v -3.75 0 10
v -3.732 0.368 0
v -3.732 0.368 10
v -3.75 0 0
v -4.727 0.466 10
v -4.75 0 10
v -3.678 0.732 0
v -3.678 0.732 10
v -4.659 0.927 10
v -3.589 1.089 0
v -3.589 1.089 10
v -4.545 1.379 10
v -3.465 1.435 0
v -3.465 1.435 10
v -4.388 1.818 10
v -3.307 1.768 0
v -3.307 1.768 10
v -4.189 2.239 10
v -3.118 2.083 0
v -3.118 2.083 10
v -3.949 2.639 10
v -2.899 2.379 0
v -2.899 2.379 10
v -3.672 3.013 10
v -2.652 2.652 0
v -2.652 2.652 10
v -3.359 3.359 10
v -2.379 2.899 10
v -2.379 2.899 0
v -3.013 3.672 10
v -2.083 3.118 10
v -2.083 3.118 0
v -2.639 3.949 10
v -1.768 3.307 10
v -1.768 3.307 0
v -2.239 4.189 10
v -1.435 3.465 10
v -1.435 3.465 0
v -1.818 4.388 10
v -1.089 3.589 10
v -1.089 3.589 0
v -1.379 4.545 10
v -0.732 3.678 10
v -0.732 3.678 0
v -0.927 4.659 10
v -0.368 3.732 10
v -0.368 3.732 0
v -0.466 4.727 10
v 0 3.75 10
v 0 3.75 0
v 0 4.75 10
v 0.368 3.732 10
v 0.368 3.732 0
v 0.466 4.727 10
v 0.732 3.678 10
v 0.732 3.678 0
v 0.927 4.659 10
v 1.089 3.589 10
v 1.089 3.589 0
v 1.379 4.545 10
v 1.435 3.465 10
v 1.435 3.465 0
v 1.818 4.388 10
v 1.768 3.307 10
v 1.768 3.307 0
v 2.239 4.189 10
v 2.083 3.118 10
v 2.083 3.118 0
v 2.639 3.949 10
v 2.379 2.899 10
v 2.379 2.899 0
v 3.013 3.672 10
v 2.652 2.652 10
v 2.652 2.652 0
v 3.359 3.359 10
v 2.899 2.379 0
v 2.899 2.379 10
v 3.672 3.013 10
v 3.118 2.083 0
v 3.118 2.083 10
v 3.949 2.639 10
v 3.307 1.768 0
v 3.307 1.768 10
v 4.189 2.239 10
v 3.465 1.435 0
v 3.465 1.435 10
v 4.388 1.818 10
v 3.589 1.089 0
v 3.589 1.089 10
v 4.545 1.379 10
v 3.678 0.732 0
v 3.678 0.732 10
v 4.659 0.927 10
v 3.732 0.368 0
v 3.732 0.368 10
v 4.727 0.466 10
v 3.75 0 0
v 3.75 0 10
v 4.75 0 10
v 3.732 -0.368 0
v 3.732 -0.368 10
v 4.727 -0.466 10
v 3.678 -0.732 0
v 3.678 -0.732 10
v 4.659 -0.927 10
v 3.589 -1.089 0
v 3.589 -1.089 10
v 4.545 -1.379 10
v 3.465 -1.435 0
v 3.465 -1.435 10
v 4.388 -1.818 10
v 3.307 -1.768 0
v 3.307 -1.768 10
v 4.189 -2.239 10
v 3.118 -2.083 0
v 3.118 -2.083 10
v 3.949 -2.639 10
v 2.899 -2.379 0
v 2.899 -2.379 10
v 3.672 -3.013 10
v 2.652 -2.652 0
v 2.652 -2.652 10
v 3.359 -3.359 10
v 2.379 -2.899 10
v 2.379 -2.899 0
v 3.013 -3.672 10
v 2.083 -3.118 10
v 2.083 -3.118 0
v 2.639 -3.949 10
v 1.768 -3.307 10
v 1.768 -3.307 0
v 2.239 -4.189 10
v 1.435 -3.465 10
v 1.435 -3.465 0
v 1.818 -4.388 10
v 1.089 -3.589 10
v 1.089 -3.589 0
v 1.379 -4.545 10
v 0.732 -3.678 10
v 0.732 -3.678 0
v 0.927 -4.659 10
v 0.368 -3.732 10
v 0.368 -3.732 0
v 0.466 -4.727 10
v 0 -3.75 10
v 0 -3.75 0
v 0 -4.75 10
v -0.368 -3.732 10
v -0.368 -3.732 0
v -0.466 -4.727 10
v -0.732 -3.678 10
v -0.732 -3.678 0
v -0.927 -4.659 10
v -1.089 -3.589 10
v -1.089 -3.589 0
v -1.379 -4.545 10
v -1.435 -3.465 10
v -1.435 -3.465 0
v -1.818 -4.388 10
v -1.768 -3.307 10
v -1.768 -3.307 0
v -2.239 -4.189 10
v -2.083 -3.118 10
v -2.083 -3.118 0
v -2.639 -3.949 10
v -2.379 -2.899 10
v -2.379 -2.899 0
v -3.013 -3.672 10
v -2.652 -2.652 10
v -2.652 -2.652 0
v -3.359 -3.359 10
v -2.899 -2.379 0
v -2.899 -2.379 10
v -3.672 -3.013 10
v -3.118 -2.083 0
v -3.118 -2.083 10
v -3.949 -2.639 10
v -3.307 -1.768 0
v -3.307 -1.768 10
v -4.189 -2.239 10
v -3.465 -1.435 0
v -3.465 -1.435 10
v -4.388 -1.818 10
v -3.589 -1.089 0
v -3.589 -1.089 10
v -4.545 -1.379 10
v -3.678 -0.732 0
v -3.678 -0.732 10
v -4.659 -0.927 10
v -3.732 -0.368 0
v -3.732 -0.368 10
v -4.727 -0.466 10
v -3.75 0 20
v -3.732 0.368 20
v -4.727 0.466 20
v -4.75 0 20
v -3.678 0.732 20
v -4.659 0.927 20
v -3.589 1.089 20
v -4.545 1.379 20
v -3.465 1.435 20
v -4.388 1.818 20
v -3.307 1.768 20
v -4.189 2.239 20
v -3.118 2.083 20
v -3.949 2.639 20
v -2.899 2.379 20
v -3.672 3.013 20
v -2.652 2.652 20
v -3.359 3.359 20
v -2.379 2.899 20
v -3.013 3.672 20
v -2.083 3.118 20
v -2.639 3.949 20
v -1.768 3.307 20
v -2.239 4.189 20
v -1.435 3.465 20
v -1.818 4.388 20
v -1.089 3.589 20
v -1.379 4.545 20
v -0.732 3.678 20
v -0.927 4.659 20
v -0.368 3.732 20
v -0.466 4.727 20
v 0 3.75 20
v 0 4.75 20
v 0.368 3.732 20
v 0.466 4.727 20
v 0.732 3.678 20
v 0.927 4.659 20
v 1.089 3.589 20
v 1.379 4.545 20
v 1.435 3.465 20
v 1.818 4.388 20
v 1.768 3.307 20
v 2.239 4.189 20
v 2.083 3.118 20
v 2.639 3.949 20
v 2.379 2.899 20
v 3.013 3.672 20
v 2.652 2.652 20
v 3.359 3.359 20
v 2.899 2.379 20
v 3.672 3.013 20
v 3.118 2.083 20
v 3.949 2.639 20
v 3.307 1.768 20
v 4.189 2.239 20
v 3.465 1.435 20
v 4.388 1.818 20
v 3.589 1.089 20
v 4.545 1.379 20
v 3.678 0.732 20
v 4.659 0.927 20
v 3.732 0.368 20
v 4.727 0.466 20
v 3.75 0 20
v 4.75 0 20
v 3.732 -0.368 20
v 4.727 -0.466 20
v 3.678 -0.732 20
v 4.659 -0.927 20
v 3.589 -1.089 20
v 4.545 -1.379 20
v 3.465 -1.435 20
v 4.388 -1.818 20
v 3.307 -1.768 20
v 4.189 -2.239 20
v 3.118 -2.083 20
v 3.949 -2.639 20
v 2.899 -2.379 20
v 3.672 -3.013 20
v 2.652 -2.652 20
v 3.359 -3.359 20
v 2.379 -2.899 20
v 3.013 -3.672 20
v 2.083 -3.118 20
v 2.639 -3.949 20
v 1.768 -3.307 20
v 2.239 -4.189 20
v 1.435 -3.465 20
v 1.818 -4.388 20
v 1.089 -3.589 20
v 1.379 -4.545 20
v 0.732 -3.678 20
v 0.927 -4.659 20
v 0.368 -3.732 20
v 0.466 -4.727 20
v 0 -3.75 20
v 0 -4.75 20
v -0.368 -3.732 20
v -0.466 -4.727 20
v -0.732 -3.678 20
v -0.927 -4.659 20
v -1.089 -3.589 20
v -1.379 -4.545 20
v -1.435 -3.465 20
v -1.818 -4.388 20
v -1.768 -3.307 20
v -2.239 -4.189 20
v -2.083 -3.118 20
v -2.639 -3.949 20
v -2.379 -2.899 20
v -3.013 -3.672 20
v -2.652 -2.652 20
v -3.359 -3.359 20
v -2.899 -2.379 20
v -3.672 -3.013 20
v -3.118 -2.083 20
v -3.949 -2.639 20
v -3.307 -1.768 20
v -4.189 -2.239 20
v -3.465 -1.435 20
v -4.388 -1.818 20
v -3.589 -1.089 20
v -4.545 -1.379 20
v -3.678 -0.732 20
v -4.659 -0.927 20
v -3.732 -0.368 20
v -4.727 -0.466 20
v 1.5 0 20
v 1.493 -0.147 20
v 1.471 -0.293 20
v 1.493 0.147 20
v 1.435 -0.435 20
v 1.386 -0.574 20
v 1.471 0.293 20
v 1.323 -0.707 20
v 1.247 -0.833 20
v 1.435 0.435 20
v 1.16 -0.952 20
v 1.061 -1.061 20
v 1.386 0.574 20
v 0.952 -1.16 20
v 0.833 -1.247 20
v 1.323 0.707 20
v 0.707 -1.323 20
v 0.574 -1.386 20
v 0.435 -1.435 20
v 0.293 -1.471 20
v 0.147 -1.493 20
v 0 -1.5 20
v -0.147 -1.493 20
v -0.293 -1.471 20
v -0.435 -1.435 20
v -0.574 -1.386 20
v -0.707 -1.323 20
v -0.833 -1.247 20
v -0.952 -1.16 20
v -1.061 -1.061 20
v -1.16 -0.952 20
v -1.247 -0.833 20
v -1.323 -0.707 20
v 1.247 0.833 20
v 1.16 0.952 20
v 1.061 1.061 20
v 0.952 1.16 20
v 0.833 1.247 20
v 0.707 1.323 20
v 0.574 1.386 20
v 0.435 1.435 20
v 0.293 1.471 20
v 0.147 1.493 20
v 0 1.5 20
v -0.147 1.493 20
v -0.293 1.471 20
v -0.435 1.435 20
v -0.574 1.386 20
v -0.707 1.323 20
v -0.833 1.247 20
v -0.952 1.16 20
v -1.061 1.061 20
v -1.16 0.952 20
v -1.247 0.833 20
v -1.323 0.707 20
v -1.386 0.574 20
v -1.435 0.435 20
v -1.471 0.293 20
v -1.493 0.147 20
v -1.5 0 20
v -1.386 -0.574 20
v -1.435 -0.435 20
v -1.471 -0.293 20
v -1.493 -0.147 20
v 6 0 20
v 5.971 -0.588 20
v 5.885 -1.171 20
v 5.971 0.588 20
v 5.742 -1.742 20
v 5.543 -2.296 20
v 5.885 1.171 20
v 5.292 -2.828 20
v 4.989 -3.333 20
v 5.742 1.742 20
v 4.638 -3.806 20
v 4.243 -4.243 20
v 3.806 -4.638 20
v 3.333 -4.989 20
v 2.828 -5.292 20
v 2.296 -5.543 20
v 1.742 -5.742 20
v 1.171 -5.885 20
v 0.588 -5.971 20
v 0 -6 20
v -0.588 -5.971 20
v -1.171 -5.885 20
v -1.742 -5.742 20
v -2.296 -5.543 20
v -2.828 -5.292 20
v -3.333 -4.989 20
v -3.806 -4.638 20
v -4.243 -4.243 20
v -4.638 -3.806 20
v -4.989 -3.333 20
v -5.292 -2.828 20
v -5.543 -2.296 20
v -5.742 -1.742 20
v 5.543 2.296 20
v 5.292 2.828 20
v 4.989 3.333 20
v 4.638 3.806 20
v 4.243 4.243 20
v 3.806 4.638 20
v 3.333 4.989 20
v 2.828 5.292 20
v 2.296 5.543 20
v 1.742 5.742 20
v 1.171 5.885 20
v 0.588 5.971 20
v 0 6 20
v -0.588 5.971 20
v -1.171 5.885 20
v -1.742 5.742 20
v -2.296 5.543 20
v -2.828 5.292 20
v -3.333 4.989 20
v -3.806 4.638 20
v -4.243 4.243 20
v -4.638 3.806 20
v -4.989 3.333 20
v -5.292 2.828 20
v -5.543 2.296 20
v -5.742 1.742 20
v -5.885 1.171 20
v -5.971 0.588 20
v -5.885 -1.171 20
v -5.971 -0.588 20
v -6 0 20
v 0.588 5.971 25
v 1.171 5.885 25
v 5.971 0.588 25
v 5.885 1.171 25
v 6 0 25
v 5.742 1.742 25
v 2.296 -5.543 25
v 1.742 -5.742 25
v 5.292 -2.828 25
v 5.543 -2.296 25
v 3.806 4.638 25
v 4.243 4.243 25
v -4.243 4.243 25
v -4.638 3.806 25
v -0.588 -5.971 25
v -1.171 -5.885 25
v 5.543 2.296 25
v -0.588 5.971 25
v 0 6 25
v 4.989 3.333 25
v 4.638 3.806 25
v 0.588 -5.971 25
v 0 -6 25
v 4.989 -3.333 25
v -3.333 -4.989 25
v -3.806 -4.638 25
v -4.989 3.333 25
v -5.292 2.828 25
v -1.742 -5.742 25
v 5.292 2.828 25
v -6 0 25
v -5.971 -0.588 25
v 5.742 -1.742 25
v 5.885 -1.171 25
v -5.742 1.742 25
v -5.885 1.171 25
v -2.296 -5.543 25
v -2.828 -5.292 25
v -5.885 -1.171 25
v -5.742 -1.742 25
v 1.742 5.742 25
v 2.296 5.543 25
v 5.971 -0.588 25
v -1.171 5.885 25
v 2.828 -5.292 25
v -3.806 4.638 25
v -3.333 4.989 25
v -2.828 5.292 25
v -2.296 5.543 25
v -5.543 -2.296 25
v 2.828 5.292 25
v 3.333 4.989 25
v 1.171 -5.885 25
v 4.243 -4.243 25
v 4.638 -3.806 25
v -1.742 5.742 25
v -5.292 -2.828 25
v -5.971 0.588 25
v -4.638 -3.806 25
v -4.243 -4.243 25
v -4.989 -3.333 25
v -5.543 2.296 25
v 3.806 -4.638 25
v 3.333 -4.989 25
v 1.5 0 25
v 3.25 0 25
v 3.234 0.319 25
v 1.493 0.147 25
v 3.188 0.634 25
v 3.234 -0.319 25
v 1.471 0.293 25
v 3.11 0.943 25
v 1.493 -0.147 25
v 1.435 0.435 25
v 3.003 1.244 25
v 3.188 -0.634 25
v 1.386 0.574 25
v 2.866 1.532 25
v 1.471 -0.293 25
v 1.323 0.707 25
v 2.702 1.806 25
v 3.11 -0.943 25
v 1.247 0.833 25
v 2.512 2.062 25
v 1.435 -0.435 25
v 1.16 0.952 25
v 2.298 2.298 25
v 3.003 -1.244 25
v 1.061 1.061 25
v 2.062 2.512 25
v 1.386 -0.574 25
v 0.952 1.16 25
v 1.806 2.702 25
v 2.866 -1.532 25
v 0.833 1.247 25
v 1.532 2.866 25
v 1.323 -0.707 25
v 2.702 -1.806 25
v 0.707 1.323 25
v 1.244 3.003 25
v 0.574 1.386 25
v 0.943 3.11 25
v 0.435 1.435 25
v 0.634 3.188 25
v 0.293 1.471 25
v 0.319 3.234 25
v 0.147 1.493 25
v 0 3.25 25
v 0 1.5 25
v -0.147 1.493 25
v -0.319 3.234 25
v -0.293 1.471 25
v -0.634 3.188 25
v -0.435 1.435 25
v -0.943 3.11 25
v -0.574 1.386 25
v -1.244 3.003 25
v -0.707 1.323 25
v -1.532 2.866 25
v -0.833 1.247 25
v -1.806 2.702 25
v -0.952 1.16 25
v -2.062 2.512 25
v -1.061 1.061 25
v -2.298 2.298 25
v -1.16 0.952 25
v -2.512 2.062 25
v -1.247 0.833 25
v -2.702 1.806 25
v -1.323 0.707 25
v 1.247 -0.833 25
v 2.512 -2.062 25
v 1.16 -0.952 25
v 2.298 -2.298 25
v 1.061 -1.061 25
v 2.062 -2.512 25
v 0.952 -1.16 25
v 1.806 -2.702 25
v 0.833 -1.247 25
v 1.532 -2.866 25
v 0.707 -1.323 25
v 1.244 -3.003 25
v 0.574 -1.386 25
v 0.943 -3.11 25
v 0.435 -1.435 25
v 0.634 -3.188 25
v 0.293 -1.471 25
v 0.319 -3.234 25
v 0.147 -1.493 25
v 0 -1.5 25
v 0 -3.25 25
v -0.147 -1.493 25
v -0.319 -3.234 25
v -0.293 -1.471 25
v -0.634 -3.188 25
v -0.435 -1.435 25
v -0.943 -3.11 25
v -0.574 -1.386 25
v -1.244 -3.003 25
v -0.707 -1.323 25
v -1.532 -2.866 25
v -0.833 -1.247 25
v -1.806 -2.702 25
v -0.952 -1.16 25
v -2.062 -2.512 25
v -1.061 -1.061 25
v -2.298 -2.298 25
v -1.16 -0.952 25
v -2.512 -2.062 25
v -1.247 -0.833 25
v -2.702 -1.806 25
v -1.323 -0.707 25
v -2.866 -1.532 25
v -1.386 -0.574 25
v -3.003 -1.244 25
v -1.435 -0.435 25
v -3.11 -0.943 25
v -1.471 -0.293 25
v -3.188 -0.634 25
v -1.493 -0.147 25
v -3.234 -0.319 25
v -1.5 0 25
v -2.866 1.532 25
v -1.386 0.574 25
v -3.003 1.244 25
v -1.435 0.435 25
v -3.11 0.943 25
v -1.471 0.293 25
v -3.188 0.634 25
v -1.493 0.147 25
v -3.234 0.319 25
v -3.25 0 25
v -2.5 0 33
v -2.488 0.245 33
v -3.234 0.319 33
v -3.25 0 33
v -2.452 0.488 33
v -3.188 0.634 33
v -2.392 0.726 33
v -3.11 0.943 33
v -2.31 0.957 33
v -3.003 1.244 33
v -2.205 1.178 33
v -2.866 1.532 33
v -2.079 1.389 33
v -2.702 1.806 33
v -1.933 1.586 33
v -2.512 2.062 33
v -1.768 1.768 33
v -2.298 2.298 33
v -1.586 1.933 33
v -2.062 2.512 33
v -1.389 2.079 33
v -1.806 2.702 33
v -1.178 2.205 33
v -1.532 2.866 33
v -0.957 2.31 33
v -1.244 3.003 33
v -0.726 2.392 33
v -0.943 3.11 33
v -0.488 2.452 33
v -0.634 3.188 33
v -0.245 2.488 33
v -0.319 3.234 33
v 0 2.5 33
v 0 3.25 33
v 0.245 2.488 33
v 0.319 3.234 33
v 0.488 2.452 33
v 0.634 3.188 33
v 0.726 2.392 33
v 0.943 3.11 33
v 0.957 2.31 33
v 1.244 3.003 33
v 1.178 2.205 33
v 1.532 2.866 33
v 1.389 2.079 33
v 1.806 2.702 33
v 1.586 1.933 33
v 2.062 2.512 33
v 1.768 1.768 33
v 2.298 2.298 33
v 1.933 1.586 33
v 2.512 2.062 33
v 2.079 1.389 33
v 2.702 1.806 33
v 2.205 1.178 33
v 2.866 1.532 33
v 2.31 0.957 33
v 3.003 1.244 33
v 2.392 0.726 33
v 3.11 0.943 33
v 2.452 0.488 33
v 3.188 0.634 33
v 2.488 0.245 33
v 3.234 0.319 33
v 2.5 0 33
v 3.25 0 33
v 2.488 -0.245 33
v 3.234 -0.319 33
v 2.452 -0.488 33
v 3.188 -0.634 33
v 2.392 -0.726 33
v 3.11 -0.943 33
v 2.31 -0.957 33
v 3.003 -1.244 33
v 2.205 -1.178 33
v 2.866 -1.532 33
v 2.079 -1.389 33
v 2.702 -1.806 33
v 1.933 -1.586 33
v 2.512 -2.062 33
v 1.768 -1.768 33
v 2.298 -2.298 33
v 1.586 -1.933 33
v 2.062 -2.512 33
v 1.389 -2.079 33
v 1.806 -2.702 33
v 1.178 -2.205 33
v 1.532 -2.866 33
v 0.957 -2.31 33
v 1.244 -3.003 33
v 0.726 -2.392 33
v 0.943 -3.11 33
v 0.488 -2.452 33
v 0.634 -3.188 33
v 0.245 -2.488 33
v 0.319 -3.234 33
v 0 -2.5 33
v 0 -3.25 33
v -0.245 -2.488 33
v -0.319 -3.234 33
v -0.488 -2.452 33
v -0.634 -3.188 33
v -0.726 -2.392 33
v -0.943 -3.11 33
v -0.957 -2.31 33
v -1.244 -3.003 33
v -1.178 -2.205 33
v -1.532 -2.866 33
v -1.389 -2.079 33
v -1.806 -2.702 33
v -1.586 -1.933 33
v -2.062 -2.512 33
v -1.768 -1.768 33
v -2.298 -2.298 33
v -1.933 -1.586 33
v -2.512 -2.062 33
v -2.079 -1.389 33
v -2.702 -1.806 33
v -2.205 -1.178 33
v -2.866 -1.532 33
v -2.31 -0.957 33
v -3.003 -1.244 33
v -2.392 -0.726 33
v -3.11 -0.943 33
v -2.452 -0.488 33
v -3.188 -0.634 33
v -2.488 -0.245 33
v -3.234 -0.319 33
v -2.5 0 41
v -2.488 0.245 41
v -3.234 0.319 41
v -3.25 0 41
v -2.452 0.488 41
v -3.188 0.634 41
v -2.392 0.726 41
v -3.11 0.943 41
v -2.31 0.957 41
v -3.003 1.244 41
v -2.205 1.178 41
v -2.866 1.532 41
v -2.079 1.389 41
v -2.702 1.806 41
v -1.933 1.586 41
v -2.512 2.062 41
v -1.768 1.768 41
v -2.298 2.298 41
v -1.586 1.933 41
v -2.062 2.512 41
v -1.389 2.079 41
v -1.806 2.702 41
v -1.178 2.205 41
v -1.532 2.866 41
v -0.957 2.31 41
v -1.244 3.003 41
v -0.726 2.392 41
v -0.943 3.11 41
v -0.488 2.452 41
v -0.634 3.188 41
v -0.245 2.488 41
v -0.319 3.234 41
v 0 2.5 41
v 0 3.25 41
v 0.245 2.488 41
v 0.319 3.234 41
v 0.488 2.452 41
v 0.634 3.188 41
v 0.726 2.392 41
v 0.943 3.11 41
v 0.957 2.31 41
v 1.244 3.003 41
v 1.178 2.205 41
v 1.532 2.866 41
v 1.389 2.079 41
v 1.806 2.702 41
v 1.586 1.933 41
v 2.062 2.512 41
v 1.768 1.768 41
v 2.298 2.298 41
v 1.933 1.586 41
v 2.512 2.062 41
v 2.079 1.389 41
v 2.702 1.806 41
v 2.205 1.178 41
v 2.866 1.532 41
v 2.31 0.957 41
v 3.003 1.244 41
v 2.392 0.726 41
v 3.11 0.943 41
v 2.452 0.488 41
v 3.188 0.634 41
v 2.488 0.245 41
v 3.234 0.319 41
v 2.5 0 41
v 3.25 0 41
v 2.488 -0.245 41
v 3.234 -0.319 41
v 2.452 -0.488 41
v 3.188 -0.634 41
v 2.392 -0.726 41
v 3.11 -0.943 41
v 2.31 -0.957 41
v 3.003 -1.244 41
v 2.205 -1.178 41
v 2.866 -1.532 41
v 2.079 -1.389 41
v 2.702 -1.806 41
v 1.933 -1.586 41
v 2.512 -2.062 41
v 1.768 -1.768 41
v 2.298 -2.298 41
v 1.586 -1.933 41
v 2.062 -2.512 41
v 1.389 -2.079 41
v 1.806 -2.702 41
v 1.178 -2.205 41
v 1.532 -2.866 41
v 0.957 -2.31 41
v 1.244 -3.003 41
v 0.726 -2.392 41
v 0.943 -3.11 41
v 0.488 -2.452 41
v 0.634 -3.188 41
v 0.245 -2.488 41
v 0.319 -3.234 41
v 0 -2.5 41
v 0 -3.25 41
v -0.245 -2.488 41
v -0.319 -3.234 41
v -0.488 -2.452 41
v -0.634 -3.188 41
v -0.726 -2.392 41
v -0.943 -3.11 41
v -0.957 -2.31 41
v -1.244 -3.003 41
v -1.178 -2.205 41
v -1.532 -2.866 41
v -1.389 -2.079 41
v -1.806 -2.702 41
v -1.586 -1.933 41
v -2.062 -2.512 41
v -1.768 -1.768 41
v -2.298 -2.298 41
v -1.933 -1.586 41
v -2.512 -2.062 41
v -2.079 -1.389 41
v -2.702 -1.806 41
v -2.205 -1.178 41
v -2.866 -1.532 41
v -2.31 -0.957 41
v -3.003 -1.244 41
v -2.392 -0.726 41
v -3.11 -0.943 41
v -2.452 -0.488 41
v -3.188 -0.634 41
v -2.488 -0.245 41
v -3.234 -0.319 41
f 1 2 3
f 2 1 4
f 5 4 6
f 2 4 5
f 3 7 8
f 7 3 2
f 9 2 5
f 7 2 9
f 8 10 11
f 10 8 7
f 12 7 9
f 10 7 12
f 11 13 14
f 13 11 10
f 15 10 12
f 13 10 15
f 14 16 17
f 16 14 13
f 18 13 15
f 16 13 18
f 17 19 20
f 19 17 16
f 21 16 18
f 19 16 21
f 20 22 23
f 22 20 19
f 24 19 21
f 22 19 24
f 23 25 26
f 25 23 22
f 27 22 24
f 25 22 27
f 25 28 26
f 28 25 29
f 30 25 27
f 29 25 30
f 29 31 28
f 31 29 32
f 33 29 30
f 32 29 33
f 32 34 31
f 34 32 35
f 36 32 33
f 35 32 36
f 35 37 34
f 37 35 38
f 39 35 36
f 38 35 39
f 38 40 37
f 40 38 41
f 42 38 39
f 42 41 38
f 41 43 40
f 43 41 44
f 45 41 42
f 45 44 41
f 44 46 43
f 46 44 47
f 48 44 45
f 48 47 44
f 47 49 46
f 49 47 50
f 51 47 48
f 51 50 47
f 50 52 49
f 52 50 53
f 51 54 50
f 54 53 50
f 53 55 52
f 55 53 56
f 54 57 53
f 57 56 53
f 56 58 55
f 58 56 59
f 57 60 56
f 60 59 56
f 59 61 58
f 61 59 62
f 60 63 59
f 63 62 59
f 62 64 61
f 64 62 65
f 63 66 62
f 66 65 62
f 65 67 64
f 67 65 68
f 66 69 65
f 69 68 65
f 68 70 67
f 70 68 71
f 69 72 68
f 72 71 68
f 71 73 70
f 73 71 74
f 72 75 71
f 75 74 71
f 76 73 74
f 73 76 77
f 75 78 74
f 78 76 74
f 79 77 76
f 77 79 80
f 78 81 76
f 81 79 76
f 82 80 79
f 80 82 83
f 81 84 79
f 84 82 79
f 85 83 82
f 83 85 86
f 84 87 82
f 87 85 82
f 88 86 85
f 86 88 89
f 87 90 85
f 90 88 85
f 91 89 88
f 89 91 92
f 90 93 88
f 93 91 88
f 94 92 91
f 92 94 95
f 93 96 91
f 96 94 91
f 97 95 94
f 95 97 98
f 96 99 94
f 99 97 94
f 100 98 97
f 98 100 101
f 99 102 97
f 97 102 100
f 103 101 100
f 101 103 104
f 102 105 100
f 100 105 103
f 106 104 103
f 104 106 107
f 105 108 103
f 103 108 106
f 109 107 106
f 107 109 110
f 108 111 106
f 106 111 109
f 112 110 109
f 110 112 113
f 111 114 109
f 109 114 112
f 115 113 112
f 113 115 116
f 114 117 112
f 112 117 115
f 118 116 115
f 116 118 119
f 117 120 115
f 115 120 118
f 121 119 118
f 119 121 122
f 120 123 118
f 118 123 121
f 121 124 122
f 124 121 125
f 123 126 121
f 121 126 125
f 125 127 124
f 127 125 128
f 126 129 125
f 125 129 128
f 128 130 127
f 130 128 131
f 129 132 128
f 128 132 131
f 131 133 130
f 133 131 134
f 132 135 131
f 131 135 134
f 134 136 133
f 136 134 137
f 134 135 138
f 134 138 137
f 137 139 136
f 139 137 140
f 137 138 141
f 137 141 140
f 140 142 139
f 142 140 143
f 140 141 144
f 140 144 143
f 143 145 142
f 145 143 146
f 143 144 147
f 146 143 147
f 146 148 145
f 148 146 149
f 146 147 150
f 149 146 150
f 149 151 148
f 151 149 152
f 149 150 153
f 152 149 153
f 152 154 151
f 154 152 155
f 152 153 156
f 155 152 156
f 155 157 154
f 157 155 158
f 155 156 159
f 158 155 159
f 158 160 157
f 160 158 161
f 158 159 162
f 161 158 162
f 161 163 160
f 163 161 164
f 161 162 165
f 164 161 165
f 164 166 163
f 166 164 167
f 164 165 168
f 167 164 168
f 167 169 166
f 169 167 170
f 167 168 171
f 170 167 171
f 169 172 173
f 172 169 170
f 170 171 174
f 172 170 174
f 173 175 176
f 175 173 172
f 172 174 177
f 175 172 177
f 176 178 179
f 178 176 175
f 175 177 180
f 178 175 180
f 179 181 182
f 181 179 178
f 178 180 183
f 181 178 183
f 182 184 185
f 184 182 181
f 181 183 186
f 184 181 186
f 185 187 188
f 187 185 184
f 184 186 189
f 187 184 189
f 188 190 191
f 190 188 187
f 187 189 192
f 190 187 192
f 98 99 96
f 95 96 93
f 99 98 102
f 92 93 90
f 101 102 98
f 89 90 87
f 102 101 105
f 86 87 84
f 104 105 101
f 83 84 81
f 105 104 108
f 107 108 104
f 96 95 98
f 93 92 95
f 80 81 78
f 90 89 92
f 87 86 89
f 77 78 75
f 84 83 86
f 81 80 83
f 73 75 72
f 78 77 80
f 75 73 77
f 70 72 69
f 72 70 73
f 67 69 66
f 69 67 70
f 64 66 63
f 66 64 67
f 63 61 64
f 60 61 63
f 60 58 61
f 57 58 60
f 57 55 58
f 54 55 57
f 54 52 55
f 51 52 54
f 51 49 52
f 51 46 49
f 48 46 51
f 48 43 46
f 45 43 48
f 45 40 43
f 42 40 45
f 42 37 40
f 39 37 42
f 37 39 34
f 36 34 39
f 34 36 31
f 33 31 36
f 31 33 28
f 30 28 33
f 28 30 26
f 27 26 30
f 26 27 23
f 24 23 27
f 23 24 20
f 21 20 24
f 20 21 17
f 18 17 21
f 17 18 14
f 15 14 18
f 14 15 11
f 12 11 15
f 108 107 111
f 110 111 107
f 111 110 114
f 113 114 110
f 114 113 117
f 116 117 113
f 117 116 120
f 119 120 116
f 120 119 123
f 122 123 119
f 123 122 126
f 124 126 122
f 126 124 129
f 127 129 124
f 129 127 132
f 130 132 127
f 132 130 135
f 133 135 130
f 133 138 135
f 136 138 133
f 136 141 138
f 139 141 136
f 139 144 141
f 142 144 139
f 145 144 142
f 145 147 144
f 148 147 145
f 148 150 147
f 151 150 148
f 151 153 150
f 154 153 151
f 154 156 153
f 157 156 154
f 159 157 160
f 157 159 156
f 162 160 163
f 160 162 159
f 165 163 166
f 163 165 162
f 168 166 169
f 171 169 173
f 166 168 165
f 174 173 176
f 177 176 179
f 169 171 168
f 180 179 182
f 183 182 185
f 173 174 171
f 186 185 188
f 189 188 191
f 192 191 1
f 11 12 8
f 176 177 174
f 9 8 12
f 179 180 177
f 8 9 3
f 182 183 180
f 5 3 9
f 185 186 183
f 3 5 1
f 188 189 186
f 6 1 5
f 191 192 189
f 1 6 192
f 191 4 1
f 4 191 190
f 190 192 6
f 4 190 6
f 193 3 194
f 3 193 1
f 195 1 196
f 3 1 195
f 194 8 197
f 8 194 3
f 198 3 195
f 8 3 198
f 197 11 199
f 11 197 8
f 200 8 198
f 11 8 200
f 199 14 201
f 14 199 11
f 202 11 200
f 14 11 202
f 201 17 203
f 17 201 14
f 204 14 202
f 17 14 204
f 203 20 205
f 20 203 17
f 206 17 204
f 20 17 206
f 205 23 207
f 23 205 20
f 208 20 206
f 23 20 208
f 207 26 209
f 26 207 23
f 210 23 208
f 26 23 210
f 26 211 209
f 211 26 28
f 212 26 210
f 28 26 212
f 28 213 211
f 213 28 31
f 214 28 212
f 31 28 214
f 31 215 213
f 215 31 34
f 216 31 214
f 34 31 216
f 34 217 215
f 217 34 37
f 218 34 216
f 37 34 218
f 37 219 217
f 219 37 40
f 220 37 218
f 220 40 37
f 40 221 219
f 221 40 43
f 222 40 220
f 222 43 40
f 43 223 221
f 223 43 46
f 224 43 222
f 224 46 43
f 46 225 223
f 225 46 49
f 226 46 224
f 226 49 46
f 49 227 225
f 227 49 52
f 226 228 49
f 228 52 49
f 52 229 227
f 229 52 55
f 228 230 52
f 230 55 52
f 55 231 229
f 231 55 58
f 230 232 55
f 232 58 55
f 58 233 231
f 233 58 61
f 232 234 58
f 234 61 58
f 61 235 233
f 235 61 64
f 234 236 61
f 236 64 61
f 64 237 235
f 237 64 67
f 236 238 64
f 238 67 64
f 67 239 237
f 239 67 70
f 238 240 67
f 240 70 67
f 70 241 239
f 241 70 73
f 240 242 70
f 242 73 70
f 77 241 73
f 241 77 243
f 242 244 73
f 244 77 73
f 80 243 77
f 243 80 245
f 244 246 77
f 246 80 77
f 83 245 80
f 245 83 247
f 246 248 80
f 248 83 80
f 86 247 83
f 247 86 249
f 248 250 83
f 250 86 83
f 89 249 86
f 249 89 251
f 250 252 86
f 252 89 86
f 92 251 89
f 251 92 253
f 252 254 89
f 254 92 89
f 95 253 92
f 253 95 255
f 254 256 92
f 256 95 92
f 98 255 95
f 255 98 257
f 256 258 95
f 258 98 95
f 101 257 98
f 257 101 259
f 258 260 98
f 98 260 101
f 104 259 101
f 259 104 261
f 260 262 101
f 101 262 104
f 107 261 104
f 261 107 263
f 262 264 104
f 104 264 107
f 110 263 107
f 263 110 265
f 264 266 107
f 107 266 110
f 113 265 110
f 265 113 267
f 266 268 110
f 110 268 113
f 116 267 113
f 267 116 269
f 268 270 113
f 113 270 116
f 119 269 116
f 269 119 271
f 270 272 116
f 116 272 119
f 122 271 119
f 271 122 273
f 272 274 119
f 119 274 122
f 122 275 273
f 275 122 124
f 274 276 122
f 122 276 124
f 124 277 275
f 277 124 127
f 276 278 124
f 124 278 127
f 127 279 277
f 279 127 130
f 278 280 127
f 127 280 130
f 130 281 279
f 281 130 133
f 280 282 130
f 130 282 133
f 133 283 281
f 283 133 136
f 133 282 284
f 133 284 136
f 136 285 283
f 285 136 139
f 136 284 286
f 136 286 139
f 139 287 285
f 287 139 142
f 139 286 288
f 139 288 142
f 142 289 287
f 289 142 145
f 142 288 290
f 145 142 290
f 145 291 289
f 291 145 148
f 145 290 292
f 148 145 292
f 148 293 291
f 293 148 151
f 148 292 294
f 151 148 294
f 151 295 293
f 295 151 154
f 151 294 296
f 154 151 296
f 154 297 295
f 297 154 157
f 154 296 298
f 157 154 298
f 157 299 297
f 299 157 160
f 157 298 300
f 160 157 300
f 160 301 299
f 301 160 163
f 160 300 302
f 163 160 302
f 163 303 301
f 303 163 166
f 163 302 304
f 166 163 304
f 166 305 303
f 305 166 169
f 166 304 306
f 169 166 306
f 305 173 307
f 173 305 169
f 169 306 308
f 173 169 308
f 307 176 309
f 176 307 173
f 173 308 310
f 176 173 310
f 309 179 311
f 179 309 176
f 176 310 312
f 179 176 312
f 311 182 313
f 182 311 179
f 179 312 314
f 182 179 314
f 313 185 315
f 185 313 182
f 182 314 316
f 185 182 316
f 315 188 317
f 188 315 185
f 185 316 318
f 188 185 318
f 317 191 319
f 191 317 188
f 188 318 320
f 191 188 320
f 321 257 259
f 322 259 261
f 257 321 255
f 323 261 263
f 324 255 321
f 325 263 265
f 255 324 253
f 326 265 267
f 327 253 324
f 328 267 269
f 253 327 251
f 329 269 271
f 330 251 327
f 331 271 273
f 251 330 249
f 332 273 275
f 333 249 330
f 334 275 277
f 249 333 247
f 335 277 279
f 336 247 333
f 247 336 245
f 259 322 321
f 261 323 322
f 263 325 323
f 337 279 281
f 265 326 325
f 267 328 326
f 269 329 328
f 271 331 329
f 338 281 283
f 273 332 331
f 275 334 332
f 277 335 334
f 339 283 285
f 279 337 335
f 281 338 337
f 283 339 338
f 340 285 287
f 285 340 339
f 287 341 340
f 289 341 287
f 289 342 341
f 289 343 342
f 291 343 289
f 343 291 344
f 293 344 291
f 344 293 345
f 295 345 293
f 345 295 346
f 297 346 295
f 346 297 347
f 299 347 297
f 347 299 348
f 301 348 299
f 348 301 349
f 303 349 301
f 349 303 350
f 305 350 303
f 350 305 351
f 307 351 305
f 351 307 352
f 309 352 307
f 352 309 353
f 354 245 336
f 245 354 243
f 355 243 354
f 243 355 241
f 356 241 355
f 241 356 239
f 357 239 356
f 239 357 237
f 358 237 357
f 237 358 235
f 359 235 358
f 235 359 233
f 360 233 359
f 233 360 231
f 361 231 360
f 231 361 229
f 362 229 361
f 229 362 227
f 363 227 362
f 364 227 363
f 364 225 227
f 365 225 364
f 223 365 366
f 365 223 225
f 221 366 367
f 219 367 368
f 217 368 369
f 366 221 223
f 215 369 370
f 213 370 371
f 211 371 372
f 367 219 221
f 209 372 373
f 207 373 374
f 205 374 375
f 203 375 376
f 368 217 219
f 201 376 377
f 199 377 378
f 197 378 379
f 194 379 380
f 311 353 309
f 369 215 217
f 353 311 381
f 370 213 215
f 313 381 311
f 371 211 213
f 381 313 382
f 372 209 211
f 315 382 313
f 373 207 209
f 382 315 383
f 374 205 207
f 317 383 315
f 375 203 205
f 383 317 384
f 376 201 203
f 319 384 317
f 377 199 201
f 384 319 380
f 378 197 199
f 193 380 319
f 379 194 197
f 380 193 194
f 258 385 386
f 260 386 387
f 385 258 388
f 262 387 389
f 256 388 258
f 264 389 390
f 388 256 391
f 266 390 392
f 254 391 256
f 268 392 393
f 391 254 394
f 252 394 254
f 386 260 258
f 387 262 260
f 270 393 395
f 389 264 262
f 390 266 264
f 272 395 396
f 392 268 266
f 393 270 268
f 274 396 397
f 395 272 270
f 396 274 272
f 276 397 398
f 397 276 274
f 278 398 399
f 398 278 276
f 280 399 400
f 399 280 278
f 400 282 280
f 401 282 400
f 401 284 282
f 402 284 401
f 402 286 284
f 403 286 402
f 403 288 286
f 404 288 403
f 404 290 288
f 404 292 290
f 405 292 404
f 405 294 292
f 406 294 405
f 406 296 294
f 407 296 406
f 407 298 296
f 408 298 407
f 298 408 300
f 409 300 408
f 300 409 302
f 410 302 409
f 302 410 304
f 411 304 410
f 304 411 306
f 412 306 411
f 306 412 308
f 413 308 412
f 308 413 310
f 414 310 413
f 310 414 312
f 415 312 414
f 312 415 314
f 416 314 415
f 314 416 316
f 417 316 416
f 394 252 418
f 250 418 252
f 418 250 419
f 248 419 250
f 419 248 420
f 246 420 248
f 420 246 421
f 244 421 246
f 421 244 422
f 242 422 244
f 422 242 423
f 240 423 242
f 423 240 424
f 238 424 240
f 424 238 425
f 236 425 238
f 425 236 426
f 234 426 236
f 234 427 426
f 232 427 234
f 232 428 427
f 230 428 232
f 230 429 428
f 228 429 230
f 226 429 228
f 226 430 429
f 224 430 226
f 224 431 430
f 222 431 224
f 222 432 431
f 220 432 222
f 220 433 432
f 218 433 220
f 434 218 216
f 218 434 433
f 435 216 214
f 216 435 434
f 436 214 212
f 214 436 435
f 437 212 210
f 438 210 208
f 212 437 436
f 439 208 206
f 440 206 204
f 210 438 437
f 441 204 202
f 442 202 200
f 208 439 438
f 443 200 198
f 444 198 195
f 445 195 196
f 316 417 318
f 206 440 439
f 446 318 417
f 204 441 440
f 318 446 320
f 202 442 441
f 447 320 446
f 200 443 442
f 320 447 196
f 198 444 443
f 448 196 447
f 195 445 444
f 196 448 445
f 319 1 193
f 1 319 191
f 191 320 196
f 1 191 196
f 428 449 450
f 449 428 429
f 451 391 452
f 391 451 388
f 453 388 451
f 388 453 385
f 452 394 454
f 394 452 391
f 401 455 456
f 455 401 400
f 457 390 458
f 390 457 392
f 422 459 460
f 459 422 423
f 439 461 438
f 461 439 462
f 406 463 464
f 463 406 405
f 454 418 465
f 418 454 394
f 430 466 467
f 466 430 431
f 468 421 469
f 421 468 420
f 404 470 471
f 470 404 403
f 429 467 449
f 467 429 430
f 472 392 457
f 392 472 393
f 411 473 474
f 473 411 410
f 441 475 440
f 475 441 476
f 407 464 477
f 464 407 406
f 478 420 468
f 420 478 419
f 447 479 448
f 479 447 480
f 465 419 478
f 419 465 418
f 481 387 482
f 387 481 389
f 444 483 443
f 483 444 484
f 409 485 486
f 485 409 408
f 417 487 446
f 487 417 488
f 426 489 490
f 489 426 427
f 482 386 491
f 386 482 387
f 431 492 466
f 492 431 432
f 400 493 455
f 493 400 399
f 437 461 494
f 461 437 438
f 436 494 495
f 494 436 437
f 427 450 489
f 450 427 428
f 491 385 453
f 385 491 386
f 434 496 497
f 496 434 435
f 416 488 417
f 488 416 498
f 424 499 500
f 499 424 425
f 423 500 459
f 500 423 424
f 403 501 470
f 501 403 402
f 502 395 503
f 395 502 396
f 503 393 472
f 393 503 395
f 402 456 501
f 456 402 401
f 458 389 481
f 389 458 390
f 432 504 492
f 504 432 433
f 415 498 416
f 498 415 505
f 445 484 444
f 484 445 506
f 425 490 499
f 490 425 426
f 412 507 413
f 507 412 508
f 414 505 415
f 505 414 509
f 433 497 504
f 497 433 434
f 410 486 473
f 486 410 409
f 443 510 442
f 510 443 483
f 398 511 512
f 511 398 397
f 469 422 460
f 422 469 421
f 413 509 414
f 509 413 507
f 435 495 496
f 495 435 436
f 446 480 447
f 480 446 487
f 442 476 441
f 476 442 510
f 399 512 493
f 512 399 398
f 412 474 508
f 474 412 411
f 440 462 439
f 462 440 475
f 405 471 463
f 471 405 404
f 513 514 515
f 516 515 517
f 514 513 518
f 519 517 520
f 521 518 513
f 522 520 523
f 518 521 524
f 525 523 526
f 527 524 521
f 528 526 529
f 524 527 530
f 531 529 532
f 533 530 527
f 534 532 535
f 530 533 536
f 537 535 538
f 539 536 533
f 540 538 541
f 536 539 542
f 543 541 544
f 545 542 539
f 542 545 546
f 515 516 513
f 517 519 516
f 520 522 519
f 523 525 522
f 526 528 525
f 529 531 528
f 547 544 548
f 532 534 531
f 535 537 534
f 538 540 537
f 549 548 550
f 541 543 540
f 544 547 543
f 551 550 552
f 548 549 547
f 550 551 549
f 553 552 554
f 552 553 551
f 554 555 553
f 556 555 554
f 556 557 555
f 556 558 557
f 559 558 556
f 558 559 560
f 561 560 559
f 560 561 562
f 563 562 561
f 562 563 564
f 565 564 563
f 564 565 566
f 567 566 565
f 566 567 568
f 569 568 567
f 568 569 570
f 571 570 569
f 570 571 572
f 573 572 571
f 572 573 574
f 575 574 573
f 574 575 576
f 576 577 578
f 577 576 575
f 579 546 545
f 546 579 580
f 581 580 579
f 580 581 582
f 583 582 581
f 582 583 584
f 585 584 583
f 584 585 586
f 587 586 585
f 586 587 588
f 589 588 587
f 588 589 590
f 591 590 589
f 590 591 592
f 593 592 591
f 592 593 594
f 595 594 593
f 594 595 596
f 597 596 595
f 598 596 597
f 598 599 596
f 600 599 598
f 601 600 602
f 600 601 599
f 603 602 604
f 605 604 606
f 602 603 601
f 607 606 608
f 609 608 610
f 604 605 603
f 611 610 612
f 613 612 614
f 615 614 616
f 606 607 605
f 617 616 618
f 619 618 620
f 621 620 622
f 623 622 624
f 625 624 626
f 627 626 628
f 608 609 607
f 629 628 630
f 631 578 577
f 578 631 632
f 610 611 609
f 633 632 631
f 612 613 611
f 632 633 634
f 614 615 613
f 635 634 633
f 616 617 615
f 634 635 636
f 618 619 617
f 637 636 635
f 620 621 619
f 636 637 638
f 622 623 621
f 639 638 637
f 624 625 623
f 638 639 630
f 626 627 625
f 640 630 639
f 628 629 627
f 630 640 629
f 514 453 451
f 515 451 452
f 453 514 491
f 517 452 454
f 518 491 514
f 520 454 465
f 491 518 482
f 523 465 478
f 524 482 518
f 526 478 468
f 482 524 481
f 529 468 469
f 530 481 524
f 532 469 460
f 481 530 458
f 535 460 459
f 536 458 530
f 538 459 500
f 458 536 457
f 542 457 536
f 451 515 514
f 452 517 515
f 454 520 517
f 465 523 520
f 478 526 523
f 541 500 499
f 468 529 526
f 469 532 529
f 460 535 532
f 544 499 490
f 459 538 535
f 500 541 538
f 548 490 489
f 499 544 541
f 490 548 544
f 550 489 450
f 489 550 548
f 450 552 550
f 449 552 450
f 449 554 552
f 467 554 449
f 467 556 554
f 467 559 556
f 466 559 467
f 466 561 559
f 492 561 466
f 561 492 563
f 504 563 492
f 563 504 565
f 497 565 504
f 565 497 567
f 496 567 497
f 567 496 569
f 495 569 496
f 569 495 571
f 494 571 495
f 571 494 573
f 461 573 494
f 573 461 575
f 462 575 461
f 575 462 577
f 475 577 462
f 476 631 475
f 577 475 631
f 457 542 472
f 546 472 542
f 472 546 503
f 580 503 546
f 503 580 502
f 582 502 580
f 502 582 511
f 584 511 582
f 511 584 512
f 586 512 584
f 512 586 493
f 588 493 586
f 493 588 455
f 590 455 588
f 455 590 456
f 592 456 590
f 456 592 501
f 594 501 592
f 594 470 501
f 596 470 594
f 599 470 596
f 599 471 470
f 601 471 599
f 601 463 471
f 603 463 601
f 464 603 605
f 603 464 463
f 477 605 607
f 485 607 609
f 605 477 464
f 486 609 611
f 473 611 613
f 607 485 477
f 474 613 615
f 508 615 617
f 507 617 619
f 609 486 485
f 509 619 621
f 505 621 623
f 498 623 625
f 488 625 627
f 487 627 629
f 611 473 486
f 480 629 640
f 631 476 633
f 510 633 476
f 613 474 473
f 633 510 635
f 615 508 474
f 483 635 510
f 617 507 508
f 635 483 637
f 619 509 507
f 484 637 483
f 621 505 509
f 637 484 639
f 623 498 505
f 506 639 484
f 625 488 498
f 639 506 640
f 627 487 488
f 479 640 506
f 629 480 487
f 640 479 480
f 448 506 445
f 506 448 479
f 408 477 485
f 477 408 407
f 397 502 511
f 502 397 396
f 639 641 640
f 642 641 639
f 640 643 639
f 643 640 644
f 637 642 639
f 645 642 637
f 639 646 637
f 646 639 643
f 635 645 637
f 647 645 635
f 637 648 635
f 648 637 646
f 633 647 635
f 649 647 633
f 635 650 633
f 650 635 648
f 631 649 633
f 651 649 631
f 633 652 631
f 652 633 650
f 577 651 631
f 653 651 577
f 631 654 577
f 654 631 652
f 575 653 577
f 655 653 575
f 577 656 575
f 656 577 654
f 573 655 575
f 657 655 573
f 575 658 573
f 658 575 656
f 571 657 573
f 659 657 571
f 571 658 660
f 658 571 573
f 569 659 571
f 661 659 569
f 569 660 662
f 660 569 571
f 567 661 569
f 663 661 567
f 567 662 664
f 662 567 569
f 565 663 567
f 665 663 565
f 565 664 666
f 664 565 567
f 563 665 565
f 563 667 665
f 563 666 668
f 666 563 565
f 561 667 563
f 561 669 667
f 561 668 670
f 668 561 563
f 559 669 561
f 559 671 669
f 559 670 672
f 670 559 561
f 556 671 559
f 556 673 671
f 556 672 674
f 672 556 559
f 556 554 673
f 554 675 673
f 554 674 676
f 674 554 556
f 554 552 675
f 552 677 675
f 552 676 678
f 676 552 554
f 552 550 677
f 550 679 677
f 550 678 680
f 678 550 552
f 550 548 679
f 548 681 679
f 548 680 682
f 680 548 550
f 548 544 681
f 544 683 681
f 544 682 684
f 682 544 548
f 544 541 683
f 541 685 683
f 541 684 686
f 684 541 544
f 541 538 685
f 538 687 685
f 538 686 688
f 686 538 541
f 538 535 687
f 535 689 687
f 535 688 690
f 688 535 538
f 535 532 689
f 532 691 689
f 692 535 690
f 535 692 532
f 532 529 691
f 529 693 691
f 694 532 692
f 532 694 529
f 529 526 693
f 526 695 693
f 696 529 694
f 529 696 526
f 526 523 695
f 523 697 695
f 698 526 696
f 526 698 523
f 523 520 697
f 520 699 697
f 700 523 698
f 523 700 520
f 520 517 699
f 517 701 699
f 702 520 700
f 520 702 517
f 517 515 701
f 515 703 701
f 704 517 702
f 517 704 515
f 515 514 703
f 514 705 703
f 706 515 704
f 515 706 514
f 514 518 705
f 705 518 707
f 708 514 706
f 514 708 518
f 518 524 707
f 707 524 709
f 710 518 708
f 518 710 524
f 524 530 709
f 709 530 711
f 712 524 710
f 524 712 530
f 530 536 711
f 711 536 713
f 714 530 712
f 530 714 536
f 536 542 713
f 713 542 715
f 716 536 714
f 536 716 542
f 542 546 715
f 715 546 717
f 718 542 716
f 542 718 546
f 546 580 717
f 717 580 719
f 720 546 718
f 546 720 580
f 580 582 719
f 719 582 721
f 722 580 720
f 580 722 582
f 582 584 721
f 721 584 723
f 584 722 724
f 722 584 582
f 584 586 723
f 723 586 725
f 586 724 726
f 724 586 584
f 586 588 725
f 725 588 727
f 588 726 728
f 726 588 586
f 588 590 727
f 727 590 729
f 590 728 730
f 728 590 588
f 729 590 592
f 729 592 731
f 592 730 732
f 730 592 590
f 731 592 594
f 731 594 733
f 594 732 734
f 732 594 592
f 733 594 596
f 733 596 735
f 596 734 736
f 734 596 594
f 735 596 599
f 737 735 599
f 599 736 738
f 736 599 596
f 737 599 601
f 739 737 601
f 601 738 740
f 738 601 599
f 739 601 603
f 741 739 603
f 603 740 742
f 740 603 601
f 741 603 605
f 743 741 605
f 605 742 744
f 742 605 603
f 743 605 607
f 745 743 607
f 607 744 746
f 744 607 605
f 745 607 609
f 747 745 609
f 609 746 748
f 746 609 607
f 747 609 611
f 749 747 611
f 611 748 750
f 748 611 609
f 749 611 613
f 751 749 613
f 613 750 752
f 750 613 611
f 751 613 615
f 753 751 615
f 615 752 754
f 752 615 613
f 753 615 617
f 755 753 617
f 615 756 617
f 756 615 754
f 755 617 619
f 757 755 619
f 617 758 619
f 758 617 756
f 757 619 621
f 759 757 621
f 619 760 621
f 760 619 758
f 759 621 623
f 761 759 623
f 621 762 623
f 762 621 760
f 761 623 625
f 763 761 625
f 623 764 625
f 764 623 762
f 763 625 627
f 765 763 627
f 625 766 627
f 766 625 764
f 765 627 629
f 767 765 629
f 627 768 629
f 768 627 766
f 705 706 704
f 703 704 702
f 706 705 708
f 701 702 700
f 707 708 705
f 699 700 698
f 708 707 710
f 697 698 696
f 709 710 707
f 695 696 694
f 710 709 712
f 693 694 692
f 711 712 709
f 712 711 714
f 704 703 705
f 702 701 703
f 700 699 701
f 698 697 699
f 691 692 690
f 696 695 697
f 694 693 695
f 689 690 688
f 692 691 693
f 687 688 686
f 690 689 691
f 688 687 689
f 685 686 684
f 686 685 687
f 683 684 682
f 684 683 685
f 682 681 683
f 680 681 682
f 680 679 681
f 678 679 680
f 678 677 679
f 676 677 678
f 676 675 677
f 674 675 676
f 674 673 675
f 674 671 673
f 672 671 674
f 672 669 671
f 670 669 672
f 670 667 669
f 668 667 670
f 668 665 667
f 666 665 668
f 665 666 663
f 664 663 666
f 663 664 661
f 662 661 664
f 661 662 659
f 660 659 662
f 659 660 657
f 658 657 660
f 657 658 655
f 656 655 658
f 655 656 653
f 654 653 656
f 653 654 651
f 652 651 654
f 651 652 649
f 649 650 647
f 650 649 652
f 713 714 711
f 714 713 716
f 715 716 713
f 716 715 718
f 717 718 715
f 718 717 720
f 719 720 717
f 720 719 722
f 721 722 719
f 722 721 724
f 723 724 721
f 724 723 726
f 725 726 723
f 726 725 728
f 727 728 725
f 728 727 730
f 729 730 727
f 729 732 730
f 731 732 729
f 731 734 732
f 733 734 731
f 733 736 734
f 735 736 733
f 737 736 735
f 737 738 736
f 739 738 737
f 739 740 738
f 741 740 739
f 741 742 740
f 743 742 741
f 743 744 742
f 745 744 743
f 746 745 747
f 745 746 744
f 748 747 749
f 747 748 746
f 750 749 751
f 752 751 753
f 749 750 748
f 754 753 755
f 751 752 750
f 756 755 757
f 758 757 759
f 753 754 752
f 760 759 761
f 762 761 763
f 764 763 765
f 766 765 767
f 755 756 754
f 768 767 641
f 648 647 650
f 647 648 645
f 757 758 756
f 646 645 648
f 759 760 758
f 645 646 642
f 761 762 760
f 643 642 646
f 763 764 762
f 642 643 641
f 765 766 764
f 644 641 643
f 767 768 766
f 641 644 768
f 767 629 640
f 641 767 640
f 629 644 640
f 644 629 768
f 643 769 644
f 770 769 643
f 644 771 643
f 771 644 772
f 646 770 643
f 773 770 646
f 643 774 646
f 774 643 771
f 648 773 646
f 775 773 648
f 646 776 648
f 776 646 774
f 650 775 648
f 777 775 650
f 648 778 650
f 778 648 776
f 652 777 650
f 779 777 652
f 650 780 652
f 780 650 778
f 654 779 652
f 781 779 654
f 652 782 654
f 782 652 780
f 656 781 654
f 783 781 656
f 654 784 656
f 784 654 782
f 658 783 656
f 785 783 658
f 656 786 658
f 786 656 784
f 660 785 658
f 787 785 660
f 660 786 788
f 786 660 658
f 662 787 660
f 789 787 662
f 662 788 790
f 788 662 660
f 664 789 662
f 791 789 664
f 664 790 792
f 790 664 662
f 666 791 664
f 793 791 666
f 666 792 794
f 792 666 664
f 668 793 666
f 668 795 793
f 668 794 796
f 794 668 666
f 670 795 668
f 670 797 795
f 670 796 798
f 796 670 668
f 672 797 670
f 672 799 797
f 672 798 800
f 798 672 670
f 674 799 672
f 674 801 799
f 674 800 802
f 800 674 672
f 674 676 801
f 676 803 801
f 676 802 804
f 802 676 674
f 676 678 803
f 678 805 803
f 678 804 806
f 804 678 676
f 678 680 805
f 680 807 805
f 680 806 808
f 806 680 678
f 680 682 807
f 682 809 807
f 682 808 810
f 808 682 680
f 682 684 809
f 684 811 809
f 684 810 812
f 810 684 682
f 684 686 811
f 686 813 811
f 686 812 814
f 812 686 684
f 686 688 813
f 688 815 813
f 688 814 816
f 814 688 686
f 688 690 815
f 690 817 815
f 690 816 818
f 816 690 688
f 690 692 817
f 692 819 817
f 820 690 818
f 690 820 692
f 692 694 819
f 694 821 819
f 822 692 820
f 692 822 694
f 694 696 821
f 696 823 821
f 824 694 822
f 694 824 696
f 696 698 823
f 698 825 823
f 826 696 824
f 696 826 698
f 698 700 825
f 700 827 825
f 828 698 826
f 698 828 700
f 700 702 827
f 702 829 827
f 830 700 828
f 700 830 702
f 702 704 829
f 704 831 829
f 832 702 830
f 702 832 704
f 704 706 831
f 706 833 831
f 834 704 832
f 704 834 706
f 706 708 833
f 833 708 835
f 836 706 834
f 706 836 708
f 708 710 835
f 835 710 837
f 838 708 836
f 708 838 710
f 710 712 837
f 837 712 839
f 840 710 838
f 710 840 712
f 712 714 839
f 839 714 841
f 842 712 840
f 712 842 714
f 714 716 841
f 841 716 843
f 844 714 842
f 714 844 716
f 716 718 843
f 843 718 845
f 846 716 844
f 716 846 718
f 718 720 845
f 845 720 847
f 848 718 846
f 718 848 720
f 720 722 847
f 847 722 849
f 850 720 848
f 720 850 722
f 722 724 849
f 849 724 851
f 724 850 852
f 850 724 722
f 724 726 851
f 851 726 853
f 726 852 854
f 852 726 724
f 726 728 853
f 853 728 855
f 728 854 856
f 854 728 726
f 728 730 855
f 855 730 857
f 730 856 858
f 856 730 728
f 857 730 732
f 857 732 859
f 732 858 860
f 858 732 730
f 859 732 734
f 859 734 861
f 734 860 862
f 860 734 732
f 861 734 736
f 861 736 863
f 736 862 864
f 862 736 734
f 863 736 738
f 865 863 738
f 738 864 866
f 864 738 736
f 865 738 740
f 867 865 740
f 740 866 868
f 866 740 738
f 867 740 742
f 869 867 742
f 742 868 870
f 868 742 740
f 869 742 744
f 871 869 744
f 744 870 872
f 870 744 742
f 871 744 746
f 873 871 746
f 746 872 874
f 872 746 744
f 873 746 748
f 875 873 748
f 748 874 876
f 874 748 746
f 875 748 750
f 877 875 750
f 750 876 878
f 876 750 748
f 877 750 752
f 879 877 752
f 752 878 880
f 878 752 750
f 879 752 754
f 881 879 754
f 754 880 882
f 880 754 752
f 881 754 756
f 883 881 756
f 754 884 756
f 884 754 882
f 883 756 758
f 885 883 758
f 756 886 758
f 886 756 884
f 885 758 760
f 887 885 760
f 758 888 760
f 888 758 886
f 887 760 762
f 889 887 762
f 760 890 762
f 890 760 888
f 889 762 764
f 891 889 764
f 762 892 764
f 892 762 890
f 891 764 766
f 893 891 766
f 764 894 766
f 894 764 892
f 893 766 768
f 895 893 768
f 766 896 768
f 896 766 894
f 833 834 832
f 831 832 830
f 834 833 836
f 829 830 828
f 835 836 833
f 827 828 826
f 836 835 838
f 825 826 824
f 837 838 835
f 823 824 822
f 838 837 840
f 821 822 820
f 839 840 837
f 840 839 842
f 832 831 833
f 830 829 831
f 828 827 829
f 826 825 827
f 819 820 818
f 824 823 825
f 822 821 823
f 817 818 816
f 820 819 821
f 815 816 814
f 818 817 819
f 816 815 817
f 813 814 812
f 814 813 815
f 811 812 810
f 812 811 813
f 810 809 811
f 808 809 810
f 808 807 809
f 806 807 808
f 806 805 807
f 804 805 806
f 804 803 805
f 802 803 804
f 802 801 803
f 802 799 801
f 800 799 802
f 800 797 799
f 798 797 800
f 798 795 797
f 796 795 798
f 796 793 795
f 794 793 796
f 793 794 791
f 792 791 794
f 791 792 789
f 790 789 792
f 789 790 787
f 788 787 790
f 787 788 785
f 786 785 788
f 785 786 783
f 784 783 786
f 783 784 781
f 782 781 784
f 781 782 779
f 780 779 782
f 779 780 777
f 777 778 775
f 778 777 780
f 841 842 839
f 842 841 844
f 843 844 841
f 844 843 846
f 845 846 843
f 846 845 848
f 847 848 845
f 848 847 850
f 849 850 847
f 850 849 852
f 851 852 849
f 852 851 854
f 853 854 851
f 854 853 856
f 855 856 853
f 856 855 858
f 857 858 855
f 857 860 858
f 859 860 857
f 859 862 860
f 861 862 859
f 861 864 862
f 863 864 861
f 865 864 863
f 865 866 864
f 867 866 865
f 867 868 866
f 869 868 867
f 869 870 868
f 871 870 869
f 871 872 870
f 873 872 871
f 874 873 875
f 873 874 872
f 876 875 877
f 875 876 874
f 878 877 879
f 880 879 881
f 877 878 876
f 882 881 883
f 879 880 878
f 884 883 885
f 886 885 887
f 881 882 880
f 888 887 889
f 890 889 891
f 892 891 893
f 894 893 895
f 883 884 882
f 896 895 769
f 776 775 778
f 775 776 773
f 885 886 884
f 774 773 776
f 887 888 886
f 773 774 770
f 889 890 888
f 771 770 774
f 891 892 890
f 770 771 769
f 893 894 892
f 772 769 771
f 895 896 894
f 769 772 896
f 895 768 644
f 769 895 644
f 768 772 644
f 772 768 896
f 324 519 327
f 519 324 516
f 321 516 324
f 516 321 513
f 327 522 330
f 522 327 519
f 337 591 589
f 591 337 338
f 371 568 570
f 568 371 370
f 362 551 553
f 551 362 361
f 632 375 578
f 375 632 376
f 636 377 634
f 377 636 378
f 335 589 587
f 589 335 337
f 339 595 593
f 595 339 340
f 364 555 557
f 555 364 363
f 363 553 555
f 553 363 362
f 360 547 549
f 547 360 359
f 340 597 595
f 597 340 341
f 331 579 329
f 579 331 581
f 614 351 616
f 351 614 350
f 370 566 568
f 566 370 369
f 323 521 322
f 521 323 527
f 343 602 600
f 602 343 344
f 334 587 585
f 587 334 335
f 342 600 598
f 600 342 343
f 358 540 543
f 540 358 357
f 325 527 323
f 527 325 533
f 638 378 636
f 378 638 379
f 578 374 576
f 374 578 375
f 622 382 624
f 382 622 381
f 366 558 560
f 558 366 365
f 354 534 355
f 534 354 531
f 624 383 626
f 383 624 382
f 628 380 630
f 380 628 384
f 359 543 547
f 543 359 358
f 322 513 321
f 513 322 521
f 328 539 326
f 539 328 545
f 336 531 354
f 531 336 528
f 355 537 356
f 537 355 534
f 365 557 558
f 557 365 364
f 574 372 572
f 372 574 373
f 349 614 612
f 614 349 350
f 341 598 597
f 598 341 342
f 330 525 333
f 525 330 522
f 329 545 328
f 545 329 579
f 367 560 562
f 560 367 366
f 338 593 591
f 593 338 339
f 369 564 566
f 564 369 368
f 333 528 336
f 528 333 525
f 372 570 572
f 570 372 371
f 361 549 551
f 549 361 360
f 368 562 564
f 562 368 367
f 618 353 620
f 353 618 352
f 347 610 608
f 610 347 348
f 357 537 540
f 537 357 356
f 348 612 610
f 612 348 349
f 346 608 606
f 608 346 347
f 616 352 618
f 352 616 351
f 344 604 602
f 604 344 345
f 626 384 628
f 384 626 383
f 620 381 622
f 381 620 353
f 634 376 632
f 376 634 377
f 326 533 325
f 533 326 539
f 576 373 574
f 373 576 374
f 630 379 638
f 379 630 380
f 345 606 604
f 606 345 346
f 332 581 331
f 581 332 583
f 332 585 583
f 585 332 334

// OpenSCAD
//---------------------------
// Dimensions (mm)
//---------------------------
h_total = 41;                 // total height of the part
h_barb8 = 10;                 // height of each 8 mm tubing barb
h_barb5 = 8;                  // height of each 5 mm tubing barb
h_collar = 5;                 // height of the cylindrical collar
d_inner = 3;                  // bore diameter (through the whole part)

d_barb8_bottom = 7.5;          // outer diameter at bottom of 8 mm barb
d_barb8_top = 9.5;            // outer diameter at top of 8 mm barb

d_barb5_bottom = 6.5;         // outer diameter at bottom of 5 mm barb
d_barb5_top = 5.0;            // outer diameter at top of 5 mm barb

d_collar = 12;                // outer diameter of the collar

$fn = 64;                     // resolution for circles and rotate_extrude

//---------------------------
// Helper module: single barb
//---------------------------
module barb(bottom_dia, top_dia, height) {
    // 2‑D profile (radius, height) rotated around Z
    rotate_extrude(angle = 360)
        polygon(points = [
            [bottom_dia/2, 0],          // bottom radius
            [top_dia/2, height],       // top radius
            [bottom_dia/2, height],    // step back to bottom radius
            [bottom_dia/2, 0]          // close the loop
        ]);
}

//---------------------------
// Build the outer solid
//---------------------------
module outer_shape() {
    union() {
        // 8 mm tubing barbs (two stacked)
        translate([0,0,0])   barb(d_barb8_bottom, d_barb8_top, h_barb8);
        translate([0,0,h_barb8]) barb(d_barb8_bottom, d_barb8_top, h_barb8);

        // cylindrical collar (z = 20 … 25)
        translate([0,0,20]) cylinder(r = d_collar/2, h = h_collar);

        // 5 mm tubing barbs (two stacked)
        translate([0,0,25]) barb(d_barb5_bottom, d_barb5_top, h_barb5);
        translate([0,0,33]) barb(d_barb5_bottom, d_barb5_top, h_barb5);
    }
}

//---------------------------
// Final part with through bore
//---------------------------
difference() {
    outer_shape();
    // bore cylinder extends 0.5 mm beyond each end (0.5 mm > 0.01 mm)
    translate([0,0,-0.5])
        cylinder(r = d_inner/2, h = h_total + 1);
}
